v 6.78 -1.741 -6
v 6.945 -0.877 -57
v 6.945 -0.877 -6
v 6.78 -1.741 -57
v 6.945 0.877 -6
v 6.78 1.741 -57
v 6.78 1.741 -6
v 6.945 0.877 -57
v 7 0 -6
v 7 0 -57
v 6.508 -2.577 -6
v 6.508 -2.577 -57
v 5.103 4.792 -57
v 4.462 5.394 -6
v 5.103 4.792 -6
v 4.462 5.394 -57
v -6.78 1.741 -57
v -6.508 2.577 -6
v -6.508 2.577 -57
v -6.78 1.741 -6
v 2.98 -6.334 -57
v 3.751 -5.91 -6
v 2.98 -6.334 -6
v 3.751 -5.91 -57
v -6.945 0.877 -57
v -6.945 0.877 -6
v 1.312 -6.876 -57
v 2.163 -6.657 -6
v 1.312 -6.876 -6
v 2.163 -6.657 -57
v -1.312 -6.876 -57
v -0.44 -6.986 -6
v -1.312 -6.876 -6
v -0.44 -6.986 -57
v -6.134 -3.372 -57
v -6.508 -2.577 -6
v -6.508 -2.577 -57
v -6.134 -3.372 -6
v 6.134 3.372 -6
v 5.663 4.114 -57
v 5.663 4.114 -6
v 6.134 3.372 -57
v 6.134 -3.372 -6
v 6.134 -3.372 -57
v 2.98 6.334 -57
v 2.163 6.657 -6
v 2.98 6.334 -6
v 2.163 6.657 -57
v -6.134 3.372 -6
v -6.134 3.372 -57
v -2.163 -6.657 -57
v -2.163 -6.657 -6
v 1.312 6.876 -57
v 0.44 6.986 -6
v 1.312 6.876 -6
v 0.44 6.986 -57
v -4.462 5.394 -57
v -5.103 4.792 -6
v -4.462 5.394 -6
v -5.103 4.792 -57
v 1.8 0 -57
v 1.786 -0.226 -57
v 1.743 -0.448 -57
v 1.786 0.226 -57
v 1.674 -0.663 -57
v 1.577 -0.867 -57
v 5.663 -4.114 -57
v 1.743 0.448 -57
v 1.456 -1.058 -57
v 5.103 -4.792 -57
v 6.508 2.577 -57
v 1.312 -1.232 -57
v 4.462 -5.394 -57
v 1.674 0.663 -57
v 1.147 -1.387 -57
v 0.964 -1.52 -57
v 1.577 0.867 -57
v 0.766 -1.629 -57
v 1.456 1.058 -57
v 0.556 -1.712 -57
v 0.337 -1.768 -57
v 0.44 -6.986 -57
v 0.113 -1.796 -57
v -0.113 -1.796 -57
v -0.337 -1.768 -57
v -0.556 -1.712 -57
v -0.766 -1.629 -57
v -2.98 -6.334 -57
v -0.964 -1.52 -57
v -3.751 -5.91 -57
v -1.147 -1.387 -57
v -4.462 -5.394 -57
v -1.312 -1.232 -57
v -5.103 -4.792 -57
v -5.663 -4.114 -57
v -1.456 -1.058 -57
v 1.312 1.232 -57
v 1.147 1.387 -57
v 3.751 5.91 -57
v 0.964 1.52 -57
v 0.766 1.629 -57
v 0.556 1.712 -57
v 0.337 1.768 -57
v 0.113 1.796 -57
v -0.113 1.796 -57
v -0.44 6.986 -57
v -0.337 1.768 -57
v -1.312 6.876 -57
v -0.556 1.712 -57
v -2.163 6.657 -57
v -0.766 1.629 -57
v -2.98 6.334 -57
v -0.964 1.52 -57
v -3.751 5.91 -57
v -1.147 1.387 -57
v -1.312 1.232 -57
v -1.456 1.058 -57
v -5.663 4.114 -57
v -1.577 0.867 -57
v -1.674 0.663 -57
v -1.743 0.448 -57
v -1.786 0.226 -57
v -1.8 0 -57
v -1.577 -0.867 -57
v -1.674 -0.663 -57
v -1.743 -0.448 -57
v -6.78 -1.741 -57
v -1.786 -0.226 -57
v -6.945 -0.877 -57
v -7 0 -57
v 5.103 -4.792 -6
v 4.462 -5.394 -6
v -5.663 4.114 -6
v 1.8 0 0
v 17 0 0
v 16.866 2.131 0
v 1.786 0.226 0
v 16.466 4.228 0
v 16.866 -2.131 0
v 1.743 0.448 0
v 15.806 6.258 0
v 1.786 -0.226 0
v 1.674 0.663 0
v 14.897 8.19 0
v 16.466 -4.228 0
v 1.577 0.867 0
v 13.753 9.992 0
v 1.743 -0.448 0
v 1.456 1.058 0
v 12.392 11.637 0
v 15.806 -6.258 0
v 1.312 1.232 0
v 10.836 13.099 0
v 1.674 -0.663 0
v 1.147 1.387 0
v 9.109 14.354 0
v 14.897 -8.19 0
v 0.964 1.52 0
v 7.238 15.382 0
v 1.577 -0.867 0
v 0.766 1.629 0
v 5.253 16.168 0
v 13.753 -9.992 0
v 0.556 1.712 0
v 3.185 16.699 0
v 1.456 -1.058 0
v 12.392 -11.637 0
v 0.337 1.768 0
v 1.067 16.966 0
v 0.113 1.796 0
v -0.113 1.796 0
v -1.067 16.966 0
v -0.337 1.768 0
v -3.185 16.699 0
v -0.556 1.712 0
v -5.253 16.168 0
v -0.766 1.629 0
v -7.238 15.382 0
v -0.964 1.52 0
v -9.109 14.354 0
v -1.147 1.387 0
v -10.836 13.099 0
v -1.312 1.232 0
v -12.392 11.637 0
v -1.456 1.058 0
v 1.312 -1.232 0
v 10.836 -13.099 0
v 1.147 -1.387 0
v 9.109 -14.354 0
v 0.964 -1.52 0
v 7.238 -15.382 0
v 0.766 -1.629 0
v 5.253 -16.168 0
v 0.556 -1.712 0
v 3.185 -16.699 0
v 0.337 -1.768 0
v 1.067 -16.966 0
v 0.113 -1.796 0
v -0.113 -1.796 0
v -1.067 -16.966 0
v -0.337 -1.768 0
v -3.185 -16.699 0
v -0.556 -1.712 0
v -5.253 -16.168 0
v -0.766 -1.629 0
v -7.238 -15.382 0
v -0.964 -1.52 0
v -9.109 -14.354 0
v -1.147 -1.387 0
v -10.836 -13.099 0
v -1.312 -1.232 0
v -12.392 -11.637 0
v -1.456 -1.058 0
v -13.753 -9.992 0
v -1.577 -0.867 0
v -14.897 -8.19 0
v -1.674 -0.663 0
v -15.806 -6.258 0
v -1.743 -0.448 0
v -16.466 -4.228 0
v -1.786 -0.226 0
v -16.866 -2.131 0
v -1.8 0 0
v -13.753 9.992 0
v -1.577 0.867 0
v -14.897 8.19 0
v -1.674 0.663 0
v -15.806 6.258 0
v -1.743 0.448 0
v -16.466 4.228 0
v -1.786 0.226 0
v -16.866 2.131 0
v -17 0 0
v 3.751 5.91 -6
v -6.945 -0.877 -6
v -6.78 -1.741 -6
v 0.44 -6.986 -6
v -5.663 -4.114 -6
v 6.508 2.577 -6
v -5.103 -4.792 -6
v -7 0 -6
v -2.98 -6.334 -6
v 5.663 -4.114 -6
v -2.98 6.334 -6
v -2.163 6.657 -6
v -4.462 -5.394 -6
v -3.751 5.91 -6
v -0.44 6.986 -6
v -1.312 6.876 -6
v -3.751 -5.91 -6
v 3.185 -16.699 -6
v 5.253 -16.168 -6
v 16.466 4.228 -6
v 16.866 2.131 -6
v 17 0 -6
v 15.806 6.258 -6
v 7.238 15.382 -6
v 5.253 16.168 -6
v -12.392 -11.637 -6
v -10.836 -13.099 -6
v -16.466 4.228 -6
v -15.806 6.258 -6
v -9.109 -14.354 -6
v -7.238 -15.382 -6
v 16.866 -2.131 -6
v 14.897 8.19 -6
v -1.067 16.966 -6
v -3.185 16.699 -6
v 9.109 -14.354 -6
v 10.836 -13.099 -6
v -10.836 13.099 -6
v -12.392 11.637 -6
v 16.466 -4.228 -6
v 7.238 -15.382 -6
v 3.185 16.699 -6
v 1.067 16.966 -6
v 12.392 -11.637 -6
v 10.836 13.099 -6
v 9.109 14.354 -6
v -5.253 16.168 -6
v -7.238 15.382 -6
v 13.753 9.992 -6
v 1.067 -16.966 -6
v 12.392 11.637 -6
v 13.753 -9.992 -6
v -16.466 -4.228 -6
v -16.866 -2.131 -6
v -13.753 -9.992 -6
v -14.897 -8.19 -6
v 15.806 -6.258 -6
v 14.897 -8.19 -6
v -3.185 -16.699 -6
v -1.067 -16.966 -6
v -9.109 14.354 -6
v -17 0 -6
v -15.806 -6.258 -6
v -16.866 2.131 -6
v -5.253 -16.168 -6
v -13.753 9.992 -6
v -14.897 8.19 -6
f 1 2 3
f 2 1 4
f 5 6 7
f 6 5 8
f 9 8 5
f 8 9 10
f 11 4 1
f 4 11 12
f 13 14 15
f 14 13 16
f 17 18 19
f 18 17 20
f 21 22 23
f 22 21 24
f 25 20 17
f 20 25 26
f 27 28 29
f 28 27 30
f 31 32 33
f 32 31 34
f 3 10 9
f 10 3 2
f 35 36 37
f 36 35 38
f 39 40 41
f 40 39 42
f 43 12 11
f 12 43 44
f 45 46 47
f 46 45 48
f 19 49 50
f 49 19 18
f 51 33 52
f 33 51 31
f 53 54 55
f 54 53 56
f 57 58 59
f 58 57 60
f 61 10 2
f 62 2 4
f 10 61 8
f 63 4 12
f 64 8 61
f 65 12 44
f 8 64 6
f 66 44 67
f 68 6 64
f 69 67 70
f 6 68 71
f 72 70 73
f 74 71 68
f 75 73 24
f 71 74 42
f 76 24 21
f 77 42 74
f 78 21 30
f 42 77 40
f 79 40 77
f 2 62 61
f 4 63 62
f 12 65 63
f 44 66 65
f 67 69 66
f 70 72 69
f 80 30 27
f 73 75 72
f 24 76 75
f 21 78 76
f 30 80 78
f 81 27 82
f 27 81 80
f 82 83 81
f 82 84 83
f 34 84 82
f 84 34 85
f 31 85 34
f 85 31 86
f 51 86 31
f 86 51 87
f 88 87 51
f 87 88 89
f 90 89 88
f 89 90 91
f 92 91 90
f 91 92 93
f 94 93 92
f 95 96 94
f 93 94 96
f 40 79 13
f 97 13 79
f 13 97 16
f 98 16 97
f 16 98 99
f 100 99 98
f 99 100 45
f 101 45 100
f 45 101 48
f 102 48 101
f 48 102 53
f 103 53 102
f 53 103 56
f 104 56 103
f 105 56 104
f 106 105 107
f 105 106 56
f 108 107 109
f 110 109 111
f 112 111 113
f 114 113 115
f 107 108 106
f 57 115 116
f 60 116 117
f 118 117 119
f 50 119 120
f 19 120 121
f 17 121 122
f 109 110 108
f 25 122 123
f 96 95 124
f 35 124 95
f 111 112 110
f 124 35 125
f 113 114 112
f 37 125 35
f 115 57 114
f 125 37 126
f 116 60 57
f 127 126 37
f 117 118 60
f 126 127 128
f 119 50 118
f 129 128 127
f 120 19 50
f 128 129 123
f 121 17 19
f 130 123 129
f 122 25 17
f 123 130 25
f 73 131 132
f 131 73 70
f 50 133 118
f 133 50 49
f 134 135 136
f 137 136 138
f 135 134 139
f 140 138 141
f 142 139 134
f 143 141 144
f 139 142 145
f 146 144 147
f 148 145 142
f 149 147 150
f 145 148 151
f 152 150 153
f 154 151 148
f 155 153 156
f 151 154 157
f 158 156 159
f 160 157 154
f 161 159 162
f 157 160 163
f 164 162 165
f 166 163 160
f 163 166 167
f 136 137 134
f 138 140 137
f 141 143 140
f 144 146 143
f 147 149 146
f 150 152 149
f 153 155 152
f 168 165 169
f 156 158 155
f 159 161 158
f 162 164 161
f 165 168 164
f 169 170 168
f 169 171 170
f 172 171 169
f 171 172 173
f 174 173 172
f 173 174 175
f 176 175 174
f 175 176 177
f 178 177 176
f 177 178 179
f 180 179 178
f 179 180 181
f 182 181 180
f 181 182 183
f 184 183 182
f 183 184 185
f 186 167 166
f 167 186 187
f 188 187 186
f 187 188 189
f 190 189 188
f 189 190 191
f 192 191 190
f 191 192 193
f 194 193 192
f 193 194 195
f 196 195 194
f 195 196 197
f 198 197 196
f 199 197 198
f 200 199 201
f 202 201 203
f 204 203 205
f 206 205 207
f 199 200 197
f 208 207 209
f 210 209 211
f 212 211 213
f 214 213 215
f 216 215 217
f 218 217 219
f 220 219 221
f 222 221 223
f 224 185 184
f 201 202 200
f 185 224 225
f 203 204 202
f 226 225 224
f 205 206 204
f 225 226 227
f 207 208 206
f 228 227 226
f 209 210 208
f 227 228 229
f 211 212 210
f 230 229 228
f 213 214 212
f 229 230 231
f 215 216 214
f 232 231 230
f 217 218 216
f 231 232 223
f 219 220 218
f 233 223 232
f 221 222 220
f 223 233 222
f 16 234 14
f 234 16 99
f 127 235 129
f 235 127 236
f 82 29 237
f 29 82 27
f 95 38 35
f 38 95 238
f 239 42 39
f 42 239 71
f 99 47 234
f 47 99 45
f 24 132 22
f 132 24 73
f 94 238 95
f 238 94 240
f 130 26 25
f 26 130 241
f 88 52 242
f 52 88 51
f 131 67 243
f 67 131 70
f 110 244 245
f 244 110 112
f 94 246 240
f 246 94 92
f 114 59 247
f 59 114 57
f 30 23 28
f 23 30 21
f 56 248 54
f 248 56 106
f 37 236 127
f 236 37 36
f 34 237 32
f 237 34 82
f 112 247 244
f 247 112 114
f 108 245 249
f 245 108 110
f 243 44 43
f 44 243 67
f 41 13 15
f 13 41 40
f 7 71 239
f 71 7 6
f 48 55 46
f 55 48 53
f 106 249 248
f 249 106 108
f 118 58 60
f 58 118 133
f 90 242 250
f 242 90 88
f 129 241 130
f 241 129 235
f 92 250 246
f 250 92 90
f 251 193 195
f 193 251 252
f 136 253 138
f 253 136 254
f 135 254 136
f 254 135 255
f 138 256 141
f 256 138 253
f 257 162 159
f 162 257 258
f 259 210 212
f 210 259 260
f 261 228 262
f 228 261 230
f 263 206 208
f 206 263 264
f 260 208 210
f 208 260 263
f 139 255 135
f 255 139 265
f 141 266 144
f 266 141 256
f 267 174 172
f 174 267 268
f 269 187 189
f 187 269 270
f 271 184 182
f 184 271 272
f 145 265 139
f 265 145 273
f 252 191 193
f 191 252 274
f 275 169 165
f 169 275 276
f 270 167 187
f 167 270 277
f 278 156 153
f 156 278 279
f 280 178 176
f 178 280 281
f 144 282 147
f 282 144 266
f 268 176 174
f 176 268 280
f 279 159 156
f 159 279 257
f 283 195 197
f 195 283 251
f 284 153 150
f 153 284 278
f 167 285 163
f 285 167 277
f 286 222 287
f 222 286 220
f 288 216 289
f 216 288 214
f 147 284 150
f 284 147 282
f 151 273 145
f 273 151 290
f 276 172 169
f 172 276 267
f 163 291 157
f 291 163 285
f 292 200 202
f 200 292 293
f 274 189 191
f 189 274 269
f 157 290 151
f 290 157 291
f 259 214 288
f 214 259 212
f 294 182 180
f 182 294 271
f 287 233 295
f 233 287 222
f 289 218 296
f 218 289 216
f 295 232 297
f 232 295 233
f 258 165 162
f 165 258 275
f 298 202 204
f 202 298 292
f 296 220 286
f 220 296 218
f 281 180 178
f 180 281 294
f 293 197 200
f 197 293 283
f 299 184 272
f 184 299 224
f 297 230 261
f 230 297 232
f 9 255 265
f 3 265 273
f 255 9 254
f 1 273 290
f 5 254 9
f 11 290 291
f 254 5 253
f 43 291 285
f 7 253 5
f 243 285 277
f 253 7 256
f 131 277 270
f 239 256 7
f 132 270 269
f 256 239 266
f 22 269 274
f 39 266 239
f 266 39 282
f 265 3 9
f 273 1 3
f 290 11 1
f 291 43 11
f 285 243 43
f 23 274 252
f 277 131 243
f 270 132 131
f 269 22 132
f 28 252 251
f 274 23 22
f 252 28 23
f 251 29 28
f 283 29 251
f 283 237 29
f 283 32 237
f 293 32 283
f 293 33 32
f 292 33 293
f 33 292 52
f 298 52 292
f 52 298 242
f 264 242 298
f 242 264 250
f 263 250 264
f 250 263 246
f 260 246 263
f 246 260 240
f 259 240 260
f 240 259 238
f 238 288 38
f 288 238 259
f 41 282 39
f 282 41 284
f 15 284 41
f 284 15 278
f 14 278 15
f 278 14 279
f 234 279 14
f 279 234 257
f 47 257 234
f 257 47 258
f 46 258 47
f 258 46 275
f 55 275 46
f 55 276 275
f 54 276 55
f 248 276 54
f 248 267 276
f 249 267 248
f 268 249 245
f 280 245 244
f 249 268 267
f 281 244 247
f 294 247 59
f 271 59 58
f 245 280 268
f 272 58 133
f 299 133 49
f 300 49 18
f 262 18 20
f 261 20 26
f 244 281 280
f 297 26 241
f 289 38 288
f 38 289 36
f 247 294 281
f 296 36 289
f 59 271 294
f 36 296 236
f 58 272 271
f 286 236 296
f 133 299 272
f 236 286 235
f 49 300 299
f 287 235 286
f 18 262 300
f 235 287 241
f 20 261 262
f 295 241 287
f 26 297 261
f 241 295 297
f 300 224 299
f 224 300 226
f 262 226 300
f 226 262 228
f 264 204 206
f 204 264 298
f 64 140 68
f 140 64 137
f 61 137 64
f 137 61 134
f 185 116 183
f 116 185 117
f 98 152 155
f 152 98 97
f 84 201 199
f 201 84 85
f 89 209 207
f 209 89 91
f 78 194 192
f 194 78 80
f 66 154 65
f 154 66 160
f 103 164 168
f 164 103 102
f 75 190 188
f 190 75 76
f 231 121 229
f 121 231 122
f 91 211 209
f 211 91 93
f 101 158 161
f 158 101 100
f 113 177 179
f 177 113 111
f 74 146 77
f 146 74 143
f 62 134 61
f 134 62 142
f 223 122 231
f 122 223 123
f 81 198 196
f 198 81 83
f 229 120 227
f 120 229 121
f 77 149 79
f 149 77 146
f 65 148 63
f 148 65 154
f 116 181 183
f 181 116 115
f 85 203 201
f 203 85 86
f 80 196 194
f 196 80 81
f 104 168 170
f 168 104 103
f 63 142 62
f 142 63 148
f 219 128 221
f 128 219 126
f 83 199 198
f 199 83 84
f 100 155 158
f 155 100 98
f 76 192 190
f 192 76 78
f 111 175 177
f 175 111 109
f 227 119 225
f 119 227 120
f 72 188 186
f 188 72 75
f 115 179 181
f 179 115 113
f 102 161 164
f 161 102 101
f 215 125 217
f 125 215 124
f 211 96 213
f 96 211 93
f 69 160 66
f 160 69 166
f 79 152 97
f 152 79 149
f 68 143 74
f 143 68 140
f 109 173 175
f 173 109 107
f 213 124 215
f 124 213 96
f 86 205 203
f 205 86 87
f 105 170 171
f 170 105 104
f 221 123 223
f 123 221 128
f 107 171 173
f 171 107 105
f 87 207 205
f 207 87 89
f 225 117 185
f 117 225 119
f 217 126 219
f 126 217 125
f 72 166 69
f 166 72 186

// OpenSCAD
$fn = 50;


difference() {
	union() {
		translate(v = [0, 0, -57.0000000000]) {
			cylinder(h = 57, r = 7.0000000000);
		}
		translate(v = [0, 0, -6.0000000000]) {
			cylinder(h = 6, r = 17.0000000000);
		}
	}
	union() {
		#translate(v = [0, 0, -57]) {
			cylinder(h = 57, r = 1.8000000000);
		}
	}
}
